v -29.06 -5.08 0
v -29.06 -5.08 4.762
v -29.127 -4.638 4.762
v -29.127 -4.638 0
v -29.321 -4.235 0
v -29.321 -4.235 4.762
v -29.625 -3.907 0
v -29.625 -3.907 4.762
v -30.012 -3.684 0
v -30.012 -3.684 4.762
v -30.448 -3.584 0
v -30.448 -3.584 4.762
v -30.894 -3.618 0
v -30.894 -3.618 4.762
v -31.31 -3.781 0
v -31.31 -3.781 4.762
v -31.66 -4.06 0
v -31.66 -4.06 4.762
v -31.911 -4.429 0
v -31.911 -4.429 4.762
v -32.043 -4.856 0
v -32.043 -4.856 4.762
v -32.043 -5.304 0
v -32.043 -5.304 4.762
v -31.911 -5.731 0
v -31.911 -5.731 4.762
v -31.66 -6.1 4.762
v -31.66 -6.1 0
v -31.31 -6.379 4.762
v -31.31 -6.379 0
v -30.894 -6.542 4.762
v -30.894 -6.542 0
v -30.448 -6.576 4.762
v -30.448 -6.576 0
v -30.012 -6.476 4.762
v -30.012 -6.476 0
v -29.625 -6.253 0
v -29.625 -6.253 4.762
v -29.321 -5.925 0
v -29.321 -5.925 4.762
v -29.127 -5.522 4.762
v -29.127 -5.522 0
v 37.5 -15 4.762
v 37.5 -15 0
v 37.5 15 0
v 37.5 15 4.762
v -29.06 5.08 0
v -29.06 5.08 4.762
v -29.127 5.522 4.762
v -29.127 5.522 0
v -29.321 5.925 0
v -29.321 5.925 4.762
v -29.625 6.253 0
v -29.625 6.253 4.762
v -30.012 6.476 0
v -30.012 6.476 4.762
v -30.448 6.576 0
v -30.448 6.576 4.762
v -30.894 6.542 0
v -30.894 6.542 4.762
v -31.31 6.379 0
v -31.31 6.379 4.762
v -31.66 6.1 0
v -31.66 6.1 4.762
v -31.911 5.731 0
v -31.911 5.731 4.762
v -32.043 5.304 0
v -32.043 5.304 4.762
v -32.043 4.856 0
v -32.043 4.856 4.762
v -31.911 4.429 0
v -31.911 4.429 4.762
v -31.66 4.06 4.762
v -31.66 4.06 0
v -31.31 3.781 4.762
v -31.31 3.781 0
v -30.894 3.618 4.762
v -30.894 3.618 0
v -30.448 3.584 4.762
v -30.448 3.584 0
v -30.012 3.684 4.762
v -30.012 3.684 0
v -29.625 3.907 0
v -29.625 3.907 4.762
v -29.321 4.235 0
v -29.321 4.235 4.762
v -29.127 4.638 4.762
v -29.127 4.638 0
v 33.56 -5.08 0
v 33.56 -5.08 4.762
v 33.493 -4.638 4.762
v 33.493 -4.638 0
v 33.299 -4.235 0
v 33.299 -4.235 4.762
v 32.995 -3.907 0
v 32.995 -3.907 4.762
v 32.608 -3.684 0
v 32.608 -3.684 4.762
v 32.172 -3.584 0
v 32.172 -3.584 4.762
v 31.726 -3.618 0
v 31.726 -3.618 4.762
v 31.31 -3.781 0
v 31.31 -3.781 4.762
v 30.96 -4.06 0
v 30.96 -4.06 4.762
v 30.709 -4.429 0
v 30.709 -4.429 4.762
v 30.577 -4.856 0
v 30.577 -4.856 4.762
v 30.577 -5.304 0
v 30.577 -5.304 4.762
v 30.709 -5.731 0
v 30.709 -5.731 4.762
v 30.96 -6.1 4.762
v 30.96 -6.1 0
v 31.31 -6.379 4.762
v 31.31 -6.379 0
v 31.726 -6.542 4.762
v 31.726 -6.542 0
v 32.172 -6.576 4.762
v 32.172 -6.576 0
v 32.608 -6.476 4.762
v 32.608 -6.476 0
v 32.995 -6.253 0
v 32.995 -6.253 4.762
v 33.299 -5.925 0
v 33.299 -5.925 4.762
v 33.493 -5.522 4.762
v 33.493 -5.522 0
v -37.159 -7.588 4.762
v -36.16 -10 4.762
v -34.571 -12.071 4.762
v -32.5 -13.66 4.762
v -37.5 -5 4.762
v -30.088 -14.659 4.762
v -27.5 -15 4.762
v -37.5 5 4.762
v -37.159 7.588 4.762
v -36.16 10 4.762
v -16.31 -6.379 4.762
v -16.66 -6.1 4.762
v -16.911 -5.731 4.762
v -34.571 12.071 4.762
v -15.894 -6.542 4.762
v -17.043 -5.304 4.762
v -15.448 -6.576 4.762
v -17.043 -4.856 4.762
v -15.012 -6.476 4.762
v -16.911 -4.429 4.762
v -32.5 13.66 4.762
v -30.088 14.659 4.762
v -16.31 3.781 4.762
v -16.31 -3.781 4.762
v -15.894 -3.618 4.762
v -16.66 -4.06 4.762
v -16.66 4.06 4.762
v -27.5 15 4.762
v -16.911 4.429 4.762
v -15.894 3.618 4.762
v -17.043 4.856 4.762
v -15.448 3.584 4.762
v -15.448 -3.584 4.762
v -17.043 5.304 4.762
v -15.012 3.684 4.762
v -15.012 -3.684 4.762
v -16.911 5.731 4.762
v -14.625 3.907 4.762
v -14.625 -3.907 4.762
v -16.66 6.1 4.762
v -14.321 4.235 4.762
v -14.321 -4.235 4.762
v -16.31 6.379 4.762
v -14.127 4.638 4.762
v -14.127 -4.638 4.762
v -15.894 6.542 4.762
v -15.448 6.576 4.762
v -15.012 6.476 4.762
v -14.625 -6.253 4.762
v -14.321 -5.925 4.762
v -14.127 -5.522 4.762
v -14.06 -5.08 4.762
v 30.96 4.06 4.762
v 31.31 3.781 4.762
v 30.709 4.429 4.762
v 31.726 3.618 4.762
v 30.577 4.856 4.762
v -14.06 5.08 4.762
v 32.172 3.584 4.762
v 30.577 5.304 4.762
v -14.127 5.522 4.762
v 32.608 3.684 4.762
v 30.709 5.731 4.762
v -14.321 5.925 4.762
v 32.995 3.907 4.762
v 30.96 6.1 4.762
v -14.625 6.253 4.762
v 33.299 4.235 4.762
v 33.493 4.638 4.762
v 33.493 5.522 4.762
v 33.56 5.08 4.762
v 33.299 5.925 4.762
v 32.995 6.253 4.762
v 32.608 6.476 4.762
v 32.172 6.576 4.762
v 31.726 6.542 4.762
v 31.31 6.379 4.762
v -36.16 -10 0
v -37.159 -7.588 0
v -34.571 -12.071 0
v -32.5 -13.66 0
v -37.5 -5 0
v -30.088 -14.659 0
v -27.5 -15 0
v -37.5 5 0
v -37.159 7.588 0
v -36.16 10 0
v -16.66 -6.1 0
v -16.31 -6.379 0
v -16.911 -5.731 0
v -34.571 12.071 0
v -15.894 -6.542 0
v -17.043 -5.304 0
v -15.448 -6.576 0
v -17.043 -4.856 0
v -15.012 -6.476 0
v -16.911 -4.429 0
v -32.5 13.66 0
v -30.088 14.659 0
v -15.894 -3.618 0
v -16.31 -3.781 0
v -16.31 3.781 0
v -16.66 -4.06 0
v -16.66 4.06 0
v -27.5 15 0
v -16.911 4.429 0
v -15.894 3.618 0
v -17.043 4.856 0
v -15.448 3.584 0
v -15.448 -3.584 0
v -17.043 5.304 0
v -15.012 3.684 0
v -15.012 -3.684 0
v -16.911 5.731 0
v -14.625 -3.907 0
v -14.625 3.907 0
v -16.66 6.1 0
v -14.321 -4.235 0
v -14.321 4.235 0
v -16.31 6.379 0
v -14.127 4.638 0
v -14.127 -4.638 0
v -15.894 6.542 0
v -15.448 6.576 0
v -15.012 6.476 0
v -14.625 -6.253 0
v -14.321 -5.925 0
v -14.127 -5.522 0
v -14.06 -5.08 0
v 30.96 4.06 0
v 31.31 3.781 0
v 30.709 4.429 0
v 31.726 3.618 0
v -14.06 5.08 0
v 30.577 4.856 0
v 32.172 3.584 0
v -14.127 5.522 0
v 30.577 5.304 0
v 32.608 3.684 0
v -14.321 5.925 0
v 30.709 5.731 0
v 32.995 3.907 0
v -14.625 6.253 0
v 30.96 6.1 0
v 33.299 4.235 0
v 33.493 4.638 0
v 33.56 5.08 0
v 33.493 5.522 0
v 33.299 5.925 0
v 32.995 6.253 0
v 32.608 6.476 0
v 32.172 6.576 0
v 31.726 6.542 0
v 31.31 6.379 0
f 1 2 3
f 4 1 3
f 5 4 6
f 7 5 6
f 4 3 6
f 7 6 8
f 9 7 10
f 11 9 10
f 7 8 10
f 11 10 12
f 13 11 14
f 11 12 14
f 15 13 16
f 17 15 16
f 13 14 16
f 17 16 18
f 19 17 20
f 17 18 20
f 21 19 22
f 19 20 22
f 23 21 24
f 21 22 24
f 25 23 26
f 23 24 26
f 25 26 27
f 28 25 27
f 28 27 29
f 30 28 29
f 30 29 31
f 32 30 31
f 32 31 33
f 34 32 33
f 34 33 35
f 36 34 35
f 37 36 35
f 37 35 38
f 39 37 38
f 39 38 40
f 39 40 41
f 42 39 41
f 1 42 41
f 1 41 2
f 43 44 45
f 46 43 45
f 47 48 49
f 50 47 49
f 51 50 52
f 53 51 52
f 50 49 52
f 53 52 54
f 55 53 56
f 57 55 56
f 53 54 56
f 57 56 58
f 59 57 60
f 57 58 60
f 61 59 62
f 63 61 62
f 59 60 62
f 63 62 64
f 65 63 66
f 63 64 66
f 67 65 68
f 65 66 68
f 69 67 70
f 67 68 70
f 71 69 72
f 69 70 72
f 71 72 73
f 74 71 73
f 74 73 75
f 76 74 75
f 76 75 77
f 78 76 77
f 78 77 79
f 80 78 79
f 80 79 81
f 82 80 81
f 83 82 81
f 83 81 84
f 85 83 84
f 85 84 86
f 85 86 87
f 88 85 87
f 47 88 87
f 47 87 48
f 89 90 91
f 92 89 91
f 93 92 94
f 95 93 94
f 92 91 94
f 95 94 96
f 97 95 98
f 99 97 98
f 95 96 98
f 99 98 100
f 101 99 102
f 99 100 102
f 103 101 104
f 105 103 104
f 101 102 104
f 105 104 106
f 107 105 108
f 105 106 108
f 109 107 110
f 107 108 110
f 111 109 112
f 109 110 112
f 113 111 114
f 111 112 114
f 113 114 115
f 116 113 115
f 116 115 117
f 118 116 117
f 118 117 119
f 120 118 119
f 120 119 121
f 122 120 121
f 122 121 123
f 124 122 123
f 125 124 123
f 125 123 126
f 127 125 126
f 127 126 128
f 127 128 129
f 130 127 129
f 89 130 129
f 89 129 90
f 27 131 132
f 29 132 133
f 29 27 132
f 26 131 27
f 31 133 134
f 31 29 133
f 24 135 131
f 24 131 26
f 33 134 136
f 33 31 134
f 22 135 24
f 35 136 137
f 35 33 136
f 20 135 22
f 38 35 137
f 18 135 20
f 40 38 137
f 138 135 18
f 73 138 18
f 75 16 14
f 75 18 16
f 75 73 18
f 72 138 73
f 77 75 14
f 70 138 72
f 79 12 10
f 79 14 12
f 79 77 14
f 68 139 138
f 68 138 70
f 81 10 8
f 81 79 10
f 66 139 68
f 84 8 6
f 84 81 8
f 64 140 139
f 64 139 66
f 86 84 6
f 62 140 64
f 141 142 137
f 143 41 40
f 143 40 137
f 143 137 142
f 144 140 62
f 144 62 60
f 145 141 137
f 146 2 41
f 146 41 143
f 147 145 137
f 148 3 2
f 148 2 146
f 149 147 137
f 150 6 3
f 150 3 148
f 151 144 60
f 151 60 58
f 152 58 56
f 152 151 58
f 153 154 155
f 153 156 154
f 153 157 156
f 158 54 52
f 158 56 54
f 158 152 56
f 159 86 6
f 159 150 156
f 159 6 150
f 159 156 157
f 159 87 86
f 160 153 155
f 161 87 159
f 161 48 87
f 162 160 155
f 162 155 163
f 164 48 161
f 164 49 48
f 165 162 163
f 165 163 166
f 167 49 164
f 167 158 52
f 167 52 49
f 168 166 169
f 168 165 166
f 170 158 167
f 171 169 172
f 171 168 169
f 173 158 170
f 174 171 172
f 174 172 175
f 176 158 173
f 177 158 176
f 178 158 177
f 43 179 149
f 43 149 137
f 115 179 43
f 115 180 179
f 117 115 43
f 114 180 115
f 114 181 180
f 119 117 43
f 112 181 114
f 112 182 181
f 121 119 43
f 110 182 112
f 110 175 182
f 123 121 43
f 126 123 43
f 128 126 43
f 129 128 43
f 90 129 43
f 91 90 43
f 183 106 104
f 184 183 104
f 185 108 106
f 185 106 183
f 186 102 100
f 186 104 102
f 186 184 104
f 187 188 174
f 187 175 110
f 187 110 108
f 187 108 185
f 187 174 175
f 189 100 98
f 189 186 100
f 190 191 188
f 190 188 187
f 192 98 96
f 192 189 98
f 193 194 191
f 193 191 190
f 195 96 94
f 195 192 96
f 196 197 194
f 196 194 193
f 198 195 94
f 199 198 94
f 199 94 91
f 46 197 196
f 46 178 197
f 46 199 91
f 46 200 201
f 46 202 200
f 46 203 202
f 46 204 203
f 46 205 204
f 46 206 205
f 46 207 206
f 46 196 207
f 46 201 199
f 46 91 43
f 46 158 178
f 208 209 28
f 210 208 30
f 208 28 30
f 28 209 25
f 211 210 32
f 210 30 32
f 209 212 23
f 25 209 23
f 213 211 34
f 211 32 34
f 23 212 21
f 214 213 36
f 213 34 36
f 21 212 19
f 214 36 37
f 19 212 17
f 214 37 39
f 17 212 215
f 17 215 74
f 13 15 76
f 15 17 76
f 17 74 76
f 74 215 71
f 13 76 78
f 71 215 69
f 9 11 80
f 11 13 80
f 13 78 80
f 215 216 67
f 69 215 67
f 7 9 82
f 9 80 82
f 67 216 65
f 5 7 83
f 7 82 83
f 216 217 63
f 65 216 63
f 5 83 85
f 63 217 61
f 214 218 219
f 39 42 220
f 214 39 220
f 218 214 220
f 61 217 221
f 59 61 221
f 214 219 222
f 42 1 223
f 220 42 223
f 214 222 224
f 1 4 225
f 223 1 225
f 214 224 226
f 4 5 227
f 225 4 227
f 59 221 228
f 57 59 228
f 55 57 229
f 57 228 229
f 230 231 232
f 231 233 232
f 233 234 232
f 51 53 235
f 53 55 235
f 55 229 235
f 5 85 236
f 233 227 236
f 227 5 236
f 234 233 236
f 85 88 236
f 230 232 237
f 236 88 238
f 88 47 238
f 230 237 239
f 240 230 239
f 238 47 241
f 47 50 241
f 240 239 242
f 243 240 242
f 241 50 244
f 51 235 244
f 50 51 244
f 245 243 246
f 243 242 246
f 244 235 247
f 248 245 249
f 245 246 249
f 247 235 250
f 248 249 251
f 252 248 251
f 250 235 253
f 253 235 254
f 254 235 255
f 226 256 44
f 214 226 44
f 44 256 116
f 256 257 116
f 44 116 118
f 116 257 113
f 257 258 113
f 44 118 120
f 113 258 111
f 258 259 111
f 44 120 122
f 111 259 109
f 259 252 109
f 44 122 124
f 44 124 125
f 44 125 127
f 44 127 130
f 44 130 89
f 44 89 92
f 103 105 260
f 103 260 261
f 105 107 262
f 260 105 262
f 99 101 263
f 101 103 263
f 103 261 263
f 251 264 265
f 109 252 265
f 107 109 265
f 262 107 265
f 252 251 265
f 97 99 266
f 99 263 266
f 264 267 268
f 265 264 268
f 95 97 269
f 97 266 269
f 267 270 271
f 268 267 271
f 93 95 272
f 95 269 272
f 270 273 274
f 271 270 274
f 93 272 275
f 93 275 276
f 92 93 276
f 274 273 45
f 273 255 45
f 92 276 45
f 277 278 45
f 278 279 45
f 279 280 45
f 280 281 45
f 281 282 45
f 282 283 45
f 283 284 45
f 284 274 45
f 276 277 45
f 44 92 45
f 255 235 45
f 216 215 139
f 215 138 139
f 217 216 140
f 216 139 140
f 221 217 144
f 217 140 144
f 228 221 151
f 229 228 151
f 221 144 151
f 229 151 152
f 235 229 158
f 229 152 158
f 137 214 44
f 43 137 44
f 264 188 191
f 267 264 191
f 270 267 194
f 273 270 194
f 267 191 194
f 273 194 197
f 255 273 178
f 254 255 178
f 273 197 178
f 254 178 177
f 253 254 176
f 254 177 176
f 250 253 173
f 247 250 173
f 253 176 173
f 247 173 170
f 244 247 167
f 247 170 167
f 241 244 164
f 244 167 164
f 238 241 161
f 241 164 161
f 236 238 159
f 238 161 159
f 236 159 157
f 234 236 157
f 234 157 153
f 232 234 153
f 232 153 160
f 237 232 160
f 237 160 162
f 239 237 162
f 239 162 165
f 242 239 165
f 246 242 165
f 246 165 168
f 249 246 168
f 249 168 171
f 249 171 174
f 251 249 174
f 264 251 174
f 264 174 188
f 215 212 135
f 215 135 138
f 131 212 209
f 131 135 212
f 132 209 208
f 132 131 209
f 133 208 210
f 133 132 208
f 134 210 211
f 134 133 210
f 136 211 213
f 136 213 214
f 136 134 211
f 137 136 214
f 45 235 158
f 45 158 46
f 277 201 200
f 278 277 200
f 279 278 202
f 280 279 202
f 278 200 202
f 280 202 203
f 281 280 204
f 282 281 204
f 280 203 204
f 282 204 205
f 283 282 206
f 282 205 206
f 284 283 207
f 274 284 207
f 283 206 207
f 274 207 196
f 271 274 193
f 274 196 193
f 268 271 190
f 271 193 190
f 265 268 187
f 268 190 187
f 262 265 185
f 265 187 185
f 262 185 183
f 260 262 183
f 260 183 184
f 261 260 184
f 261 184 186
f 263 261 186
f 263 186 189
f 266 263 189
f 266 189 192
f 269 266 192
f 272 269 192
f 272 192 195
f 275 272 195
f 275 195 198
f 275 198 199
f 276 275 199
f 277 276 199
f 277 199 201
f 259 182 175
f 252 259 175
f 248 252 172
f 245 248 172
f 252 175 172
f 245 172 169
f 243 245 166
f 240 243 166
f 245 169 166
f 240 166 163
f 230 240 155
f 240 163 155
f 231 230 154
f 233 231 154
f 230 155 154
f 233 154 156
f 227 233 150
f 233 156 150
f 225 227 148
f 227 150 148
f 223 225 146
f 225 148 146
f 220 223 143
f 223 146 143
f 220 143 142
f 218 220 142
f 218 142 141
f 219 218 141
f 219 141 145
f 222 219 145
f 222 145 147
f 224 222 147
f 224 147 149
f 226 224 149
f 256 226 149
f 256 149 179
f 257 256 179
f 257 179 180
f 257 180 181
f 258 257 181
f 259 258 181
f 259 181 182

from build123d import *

# Parameters (mm, degrees)
ESQUISSE1_W             = 75
ESQUISSE1_H             = 30
BOSS_EXTRU_1_DEPTH      = 4.7625
CONG_1_R                = 10
ESQUISSE3_R             = 1.5
ENL_V_MAT_EXTRU_3_DEPTH = 10


with BuildPart() as part:
    # Esquisse1 → Boss.-Extru.1 (new body)
    with BuildSketch(Plane.XY):
        Rectangle(ESQUISSE1_W, ESQUISSE1_H)
    extrude(amount=BOSS_EXTRU_1_DEPTH)

    # Congé1
    cong_1_edges = [part.edges().sort_by_distance(p)[0] for p in [
        (-37.5, -15, 2.38125),
        (-37.5, 15, 2.38125),
    ]]
    fillet(cong_1_edges, radius=CONG_1_R)

    # Esquisse3 → Enlèv. mat.-Extru.3 (cut)
    with BuildSketch(Plane.XY.offset(4.7625)):
        with Locations((-15.56, 5.08)):
            Circle(ESQUISSE3_R)
        with Locations((-15.56, -5.08)):
            Circle(ESQUISSE3_R)
        with Locations((32.06, -5.08)):
            Circle(ESQUISSE3_R)
        with Locations((32.06, 5.08)):
            Circle(ESQUISSE3_R)
        with Locations((-30.56, 5.08)):
            Circle(ESQUISSE3_R)
        with Locations((-30.56, -5.08)):
            Circle(ESQUISSE3_R)
    extrude(amount=-ENL_V_MAT_EXTRU_3_DEPTH, mode=Mode.SUBTRACT)


solid = part.part
